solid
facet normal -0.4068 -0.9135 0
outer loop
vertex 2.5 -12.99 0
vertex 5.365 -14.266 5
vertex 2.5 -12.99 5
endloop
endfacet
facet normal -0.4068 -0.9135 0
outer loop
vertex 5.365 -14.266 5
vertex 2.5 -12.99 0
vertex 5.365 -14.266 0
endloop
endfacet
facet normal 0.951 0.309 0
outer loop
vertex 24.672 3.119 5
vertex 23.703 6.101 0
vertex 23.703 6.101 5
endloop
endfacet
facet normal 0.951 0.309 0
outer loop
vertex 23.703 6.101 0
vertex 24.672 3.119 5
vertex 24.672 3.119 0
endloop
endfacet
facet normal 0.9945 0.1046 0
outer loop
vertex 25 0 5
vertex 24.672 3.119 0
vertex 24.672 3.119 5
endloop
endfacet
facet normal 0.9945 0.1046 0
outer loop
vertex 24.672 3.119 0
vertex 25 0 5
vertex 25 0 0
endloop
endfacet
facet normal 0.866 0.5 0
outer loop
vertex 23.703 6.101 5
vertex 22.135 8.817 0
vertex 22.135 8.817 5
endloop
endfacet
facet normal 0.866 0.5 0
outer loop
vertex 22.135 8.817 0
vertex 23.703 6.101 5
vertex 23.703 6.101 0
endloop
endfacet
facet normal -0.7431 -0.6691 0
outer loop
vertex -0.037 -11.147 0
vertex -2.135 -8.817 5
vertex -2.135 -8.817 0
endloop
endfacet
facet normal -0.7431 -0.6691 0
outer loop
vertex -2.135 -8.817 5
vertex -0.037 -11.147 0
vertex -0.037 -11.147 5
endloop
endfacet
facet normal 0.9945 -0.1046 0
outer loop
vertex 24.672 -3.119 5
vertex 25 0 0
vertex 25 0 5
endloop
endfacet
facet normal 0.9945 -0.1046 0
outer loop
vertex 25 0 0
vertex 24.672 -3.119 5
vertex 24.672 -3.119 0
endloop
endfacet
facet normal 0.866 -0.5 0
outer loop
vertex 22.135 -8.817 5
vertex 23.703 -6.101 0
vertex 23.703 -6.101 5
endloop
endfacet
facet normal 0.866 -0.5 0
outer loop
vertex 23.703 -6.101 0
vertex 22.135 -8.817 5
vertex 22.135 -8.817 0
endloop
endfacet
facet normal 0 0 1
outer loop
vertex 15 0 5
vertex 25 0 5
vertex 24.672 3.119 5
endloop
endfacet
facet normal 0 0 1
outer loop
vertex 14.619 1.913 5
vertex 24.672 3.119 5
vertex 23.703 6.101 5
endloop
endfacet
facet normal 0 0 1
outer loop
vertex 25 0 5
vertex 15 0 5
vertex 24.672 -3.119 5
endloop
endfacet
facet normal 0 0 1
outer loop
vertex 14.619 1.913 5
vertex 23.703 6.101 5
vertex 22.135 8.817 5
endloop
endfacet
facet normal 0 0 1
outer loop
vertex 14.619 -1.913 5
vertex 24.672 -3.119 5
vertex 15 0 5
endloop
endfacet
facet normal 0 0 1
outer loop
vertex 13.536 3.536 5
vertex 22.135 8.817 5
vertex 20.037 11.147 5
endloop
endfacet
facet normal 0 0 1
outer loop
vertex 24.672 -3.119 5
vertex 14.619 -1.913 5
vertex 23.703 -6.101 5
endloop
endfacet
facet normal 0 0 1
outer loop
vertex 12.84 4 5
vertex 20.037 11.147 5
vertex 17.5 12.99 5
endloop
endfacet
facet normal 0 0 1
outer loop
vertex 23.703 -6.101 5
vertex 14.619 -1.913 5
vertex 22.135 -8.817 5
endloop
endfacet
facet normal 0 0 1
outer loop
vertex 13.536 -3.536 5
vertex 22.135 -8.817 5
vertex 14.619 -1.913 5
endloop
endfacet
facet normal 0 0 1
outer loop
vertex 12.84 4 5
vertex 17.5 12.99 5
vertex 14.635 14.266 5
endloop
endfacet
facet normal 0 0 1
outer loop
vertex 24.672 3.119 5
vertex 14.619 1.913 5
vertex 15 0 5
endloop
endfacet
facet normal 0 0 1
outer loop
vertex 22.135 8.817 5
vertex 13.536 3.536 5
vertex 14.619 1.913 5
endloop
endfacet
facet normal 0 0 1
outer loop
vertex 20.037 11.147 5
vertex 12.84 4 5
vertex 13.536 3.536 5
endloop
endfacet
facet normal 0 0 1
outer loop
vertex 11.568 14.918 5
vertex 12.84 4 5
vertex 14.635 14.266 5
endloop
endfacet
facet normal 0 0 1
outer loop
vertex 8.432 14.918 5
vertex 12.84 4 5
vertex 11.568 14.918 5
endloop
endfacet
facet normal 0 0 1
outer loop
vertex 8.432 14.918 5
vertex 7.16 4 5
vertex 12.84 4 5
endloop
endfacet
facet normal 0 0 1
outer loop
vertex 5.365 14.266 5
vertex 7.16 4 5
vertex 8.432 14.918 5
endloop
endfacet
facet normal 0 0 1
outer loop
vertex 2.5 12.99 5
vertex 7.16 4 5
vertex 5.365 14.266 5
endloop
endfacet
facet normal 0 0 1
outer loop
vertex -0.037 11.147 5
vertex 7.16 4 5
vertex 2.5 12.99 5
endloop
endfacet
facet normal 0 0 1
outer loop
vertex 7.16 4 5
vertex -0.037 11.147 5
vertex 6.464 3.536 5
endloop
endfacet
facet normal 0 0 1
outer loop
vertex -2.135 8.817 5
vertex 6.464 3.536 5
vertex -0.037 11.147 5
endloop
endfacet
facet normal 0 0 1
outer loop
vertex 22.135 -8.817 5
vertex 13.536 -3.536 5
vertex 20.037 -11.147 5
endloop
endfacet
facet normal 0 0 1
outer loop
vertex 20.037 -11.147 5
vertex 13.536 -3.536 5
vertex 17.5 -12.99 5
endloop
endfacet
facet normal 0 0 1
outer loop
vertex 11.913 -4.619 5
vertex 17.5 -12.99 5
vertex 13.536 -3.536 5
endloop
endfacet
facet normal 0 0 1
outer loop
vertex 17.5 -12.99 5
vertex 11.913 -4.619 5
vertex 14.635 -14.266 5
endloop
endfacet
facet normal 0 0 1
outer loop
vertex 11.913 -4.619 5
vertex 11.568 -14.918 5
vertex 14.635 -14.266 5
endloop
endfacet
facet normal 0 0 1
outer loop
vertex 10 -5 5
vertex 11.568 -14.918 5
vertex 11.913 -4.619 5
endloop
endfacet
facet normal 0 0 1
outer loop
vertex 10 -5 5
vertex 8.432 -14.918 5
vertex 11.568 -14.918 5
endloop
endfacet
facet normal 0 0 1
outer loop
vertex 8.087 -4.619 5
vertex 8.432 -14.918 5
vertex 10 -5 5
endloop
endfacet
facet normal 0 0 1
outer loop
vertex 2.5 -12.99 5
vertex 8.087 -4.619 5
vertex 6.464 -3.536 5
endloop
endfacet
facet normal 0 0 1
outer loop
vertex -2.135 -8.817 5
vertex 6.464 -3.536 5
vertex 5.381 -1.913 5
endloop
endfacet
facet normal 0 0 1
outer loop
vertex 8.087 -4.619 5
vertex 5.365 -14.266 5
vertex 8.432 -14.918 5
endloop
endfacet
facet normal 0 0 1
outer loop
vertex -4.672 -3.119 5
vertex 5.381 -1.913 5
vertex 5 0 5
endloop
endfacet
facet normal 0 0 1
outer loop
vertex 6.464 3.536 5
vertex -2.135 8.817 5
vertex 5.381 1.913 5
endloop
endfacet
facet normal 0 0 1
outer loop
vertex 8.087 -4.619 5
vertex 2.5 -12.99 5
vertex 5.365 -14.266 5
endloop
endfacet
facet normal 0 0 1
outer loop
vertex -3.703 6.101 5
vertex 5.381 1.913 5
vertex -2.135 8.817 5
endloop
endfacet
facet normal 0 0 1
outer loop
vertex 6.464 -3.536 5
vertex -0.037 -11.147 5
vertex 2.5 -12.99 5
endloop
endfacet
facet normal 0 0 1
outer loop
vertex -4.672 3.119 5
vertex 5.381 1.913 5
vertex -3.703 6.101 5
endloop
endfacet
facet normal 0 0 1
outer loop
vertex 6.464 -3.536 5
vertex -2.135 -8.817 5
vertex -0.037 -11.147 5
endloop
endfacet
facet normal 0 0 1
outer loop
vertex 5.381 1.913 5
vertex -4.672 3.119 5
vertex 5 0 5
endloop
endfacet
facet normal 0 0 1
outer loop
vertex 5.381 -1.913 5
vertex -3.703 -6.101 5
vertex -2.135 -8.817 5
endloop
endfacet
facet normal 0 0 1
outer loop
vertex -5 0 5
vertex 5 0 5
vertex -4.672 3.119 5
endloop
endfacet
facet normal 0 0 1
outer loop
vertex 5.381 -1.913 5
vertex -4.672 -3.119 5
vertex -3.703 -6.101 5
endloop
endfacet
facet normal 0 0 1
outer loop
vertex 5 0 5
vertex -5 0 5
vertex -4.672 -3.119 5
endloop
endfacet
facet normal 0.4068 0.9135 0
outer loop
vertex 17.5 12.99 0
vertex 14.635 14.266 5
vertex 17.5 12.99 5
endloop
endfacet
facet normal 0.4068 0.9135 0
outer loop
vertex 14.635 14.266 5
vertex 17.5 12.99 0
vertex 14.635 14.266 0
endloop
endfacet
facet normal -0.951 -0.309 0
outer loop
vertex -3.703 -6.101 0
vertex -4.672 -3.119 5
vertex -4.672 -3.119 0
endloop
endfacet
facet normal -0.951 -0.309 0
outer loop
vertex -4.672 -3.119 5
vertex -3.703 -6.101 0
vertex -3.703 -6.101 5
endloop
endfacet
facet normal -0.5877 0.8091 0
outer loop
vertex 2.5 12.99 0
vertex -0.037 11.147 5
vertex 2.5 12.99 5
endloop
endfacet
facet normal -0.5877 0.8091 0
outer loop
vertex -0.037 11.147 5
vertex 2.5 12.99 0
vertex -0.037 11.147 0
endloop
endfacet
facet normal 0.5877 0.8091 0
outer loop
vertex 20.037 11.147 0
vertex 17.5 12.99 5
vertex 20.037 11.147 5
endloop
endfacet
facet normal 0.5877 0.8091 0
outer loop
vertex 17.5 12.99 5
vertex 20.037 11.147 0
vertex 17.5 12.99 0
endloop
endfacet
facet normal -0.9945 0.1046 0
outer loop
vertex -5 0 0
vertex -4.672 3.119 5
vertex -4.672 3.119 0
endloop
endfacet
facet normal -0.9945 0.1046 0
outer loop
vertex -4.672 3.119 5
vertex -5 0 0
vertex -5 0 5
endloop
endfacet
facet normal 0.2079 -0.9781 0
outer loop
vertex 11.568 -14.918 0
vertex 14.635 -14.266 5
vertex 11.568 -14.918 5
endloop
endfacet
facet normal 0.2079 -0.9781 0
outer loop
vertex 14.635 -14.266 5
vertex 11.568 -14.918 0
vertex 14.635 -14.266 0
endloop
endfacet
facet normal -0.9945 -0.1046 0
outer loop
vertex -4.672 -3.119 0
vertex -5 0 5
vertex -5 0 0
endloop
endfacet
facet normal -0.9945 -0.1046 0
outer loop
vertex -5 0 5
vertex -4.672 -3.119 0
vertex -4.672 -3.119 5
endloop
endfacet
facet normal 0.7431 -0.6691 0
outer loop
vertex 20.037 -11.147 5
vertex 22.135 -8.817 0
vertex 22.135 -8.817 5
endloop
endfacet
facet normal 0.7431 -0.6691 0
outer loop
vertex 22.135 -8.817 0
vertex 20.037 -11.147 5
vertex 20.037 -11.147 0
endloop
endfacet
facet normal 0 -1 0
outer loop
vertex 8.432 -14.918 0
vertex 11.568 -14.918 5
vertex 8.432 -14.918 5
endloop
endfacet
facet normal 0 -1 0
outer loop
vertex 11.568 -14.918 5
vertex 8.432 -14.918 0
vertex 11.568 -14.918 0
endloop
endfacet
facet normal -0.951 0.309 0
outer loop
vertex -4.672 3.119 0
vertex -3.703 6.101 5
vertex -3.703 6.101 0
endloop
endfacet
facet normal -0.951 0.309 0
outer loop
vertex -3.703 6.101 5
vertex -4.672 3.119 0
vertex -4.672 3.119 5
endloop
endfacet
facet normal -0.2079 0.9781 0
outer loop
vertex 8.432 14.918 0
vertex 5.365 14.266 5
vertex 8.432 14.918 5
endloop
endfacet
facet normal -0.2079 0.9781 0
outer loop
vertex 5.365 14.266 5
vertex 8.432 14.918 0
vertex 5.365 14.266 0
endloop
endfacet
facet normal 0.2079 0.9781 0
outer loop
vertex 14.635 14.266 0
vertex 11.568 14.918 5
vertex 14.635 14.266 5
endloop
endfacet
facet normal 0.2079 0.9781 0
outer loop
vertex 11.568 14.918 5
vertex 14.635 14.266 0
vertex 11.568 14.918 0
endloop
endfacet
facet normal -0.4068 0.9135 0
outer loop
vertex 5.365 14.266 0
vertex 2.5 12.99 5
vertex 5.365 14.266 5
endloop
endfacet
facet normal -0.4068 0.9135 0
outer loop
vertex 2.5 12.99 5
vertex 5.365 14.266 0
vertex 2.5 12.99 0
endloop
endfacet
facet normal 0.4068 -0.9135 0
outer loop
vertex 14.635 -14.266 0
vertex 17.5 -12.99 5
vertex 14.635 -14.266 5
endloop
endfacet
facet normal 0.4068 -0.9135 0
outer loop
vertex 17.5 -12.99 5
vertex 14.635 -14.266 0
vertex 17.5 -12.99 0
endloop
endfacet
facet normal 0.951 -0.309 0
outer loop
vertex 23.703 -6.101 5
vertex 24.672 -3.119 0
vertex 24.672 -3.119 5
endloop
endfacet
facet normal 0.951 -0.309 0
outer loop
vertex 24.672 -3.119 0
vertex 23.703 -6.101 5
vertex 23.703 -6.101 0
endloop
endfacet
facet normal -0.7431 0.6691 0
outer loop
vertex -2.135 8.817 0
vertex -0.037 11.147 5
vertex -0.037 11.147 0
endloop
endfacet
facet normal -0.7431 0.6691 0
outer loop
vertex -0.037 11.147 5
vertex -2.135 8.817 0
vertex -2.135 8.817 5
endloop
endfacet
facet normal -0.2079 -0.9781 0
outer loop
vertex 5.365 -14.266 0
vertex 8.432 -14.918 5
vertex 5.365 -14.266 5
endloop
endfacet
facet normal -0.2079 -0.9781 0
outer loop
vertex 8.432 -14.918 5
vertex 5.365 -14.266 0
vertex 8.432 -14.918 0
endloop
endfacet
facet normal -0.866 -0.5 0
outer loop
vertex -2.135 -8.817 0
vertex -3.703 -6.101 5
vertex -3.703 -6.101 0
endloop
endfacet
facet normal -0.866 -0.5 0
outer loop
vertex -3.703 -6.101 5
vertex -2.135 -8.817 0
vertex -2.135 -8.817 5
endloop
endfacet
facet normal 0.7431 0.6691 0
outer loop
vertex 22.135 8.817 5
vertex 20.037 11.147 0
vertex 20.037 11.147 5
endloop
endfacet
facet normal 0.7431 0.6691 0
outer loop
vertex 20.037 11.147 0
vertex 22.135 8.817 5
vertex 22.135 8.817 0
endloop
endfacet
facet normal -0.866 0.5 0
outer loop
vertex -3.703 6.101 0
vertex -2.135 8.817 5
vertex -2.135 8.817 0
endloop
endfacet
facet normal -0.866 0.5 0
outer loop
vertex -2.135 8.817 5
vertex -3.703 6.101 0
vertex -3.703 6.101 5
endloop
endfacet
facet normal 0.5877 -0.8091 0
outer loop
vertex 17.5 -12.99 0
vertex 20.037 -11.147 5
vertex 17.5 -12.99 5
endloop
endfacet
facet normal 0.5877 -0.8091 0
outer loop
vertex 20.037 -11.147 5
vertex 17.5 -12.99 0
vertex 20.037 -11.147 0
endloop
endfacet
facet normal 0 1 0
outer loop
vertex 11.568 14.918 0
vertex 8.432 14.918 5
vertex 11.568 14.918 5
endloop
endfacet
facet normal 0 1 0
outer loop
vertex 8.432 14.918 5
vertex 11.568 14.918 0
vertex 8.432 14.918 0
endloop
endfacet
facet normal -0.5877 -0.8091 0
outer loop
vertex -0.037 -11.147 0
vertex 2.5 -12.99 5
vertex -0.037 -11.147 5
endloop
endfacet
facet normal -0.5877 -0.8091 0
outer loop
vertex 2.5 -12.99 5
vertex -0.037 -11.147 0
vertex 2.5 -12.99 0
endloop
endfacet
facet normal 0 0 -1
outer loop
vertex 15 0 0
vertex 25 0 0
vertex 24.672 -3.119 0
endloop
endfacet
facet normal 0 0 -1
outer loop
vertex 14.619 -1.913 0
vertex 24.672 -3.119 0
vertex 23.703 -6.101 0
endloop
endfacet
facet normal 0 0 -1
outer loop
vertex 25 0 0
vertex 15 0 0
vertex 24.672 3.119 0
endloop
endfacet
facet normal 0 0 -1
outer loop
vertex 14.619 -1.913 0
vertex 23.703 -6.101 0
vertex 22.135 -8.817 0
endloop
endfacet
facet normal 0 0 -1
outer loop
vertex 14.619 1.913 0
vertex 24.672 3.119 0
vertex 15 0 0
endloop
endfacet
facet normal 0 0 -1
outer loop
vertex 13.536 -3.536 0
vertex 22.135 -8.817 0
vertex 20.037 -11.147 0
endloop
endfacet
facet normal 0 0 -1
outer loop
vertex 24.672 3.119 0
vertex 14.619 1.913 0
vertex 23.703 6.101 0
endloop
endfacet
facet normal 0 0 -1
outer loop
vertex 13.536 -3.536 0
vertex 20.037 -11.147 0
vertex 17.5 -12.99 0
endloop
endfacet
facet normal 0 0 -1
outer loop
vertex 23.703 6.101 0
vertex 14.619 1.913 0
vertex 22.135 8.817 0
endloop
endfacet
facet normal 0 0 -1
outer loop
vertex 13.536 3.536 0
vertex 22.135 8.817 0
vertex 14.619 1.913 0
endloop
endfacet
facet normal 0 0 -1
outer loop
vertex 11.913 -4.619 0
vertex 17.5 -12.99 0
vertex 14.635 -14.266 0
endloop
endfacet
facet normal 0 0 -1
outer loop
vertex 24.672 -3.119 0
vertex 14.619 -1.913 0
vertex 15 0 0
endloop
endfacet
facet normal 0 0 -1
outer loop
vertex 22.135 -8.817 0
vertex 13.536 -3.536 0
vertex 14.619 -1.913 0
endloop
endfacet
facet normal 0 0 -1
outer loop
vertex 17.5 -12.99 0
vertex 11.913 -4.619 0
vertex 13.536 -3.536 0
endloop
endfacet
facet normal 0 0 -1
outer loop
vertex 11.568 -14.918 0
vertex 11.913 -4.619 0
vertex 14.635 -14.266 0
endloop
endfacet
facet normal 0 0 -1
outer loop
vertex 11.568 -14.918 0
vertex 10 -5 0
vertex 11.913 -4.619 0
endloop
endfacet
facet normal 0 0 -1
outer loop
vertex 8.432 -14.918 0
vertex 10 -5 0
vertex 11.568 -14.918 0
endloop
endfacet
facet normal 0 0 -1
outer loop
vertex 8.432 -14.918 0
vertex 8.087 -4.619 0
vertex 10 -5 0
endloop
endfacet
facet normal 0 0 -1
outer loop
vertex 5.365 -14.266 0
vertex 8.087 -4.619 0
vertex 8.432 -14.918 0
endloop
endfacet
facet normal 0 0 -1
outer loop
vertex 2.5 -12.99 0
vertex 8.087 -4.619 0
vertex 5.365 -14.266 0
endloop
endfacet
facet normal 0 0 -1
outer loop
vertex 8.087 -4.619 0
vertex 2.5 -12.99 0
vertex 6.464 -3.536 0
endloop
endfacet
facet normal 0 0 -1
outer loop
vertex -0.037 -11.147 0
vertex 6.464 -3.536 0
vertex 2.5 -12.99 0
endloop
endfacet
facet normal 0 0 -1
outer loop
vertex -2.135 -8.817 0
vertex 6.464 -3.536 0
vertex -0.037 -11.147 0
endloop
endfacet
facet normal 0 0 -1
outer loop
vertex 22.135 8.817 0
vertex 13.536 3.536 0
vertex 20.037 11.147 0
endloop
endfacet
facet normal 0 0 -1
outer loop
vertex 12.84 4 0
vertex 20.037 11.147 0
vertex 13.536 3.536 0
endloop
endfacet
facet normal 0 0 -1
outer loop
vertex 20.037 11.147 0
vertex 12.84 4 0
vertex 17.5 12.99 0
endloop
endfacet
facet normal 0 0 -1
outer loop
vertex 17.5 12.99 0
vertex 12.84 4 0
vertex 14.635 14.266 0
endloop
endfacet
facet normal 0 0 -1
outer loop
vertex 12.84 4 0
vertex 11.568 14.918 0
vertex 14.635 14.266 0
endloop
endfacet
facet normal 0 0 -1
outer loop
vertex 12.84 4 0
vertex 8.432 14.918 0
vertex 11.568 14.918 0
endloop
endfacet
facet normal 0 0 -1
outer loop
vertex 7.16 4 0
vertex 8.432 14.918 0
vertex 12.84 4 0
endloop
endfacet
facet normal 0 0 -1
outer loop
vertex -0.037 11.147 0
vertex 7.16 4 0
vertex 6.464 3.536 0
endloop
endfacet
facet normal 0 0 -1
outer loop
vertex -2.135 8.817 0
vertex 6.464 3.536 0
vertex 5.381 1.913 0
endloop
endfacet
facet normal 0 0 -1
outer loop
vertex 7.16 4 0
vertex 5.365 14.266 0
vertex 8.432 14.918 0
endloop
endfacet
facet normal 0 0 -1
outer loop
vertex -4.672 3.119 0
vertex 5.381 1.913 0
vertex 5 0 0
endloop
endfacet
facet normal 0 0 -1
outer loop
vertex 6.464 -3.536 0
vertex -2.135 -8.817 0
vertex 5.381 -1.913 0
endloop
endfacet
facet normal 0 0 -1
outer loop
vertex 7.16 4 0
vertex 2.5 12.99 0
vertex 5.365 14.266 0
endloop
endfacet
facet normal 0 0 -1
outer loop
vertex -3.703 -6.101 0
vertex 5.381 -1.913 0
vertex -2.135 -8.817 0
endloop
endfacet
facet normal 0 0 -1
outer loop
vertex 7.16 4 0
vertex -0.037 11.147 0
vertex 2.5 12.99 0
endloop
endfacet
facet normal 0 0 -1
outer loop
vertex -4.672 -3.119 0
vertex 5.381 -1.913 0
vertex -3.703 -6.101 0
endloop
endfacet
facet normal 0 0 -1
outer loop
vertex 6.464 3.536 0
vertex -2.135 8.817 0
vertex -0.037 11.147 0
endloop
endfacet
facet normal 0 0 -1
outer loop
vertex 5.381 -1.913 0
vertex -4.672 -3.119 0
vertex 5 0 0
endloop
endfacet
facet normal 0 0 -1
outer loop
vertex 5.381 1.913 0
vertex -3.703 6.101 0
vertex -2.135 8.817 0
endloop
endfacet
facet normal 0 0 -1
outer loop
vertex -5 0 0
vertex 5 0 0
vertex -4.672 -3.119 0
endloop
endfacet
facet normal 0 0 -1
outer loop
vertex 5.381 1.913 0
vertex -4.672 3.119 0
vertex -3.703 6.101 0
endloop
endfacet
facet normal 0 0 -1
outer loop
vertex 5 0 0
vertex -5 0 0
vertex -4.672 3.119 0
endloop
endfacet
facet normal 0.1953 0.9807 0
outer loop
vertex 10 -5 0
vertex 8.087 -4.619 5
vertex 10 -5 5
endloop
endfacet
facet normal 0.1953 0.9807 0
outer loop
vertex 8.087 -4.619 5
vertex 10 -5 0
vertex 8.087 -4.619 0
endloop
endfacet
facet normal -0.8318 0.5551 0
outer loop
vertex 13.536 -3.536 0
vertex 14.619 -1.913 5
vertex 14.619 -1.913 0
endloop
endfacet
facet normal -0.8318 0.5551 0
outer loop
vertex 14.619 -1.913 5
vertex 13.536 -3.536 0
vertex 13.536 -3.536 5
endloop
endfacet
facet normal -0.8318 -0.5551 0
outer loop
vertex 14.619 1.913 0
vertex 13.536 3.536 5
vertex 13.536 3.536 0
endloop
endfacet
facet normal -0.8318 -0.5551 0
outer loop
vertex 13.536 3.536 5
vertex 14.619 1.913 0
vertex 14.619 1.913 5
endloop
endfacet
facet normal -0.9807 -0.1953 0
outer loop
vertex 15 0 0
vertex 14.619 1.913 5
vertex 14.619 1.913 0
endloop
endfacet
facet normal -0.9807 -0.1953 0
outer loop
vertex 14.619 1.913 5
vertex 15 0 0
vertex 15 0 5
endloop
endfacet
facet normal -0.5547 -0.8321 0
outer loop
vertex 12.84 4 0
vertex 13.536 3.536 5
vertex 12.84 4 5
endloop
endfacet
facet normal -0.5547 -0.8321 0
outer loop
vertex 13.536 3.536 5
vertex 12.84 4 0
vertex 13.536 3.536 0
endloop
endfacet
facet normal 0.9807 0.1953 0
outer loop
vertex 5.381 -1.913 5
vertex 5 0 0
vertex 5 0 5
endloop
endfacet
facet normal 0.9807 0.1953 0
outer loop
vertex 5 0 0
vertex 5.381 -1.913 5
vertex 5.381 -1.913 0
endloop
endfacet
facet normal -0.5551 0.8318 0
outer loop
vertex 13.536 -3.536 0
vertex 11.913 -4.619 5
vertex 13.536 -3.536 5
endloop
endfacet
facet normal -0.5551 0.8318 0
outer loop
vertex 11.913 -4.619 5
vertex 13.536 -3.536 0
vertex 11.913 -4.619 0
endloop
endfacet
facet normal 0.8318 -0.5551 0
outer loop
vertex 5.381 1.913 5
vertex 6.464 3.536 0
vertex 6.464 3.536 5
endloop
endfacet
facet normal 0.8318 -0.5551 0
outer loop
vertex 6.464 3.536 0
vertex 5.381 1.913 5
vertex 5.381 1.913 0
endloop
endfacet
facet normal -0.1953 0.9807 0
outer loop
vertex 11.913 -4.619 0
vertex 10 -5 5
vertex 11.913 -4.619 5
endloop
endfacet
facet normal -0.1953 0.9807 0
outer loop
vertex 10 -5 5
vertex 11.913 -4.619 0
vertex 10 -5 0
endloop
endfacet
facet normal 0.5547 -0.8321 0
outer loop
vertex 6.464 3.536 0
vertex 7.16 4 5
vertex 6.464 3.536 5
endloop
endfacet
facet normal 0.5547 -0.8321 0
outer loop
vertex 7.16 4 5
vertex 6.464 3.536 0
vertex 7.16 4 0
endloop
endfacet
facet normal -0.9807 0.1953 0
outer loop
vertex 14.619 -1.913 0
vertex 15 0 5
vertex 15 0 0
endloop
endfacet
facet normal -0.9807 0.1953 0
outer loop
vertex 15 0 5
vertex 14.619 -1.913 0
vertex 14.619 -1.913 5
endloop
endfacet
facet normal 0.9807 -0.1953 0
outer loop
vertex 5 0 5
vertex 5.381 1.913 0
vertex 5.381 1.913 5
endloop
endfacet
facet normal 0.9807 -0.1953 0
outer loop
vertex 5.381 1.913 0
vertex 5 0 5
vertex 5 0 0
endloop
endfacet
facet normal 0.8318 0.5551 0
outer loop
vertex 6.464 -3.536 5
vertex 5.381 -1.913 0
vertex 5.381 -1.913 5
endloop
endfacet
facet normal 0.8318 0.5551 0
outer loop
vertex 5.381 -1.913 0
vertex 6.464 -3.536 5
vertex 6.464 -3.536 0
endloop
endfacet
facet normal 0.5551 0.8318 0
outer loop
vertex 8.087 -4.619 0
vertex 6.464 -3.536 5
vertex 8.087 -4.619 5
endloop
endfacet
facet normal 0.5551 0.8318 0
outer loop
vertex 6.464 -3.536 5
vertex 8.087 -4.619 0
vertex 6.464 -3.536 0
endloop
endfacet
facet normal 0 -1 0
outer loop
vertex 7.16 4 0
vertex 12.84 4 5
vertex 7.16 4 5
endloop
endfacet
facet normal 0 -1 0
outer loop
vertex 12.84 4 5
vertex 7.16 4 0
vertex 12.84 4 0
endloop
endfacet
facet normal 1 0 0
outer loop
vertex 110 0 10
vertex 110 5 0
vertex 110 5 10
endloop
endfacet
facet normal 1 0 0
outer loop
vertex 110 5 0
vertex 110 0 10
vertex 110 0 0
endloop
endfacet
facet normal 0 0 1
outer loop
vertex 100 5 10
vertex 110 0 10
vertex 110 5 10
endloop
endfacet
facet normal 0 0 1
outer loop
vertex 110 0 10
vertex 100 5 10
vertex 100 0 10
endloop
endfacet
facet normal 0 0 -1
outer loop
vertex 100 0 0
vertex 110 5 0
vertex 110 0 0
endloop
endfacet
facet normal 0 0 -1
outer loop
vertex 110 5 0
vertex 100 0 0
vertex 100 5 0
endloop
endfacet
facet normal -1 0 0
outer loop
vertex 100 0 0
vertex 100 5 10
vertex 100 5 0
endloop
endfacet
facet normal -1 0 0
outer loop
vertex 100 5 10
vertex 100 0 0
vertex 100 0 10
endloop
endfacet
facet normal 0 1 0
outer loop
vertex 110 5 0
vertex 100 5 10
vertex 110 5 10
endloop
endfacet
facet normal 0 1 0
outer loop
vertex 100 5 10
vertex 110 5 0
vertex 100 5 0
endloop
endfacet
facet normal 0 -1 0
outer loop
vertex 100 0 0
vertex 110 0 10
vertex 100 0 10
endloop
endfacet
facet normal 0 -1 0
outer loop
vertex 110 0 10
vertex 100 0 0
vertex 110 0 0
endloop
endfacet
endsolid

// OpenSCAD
difference(){
translate([10, 0, 0])
cylinder(5, 15, 15);


translate([10, 0, 0])
    cylinder(5, 5, 5);


}

translate([0, 4, 0])
cube([15, 7, 5]);


translate([100, 0, 0])
cube([10, 5, 10]);
